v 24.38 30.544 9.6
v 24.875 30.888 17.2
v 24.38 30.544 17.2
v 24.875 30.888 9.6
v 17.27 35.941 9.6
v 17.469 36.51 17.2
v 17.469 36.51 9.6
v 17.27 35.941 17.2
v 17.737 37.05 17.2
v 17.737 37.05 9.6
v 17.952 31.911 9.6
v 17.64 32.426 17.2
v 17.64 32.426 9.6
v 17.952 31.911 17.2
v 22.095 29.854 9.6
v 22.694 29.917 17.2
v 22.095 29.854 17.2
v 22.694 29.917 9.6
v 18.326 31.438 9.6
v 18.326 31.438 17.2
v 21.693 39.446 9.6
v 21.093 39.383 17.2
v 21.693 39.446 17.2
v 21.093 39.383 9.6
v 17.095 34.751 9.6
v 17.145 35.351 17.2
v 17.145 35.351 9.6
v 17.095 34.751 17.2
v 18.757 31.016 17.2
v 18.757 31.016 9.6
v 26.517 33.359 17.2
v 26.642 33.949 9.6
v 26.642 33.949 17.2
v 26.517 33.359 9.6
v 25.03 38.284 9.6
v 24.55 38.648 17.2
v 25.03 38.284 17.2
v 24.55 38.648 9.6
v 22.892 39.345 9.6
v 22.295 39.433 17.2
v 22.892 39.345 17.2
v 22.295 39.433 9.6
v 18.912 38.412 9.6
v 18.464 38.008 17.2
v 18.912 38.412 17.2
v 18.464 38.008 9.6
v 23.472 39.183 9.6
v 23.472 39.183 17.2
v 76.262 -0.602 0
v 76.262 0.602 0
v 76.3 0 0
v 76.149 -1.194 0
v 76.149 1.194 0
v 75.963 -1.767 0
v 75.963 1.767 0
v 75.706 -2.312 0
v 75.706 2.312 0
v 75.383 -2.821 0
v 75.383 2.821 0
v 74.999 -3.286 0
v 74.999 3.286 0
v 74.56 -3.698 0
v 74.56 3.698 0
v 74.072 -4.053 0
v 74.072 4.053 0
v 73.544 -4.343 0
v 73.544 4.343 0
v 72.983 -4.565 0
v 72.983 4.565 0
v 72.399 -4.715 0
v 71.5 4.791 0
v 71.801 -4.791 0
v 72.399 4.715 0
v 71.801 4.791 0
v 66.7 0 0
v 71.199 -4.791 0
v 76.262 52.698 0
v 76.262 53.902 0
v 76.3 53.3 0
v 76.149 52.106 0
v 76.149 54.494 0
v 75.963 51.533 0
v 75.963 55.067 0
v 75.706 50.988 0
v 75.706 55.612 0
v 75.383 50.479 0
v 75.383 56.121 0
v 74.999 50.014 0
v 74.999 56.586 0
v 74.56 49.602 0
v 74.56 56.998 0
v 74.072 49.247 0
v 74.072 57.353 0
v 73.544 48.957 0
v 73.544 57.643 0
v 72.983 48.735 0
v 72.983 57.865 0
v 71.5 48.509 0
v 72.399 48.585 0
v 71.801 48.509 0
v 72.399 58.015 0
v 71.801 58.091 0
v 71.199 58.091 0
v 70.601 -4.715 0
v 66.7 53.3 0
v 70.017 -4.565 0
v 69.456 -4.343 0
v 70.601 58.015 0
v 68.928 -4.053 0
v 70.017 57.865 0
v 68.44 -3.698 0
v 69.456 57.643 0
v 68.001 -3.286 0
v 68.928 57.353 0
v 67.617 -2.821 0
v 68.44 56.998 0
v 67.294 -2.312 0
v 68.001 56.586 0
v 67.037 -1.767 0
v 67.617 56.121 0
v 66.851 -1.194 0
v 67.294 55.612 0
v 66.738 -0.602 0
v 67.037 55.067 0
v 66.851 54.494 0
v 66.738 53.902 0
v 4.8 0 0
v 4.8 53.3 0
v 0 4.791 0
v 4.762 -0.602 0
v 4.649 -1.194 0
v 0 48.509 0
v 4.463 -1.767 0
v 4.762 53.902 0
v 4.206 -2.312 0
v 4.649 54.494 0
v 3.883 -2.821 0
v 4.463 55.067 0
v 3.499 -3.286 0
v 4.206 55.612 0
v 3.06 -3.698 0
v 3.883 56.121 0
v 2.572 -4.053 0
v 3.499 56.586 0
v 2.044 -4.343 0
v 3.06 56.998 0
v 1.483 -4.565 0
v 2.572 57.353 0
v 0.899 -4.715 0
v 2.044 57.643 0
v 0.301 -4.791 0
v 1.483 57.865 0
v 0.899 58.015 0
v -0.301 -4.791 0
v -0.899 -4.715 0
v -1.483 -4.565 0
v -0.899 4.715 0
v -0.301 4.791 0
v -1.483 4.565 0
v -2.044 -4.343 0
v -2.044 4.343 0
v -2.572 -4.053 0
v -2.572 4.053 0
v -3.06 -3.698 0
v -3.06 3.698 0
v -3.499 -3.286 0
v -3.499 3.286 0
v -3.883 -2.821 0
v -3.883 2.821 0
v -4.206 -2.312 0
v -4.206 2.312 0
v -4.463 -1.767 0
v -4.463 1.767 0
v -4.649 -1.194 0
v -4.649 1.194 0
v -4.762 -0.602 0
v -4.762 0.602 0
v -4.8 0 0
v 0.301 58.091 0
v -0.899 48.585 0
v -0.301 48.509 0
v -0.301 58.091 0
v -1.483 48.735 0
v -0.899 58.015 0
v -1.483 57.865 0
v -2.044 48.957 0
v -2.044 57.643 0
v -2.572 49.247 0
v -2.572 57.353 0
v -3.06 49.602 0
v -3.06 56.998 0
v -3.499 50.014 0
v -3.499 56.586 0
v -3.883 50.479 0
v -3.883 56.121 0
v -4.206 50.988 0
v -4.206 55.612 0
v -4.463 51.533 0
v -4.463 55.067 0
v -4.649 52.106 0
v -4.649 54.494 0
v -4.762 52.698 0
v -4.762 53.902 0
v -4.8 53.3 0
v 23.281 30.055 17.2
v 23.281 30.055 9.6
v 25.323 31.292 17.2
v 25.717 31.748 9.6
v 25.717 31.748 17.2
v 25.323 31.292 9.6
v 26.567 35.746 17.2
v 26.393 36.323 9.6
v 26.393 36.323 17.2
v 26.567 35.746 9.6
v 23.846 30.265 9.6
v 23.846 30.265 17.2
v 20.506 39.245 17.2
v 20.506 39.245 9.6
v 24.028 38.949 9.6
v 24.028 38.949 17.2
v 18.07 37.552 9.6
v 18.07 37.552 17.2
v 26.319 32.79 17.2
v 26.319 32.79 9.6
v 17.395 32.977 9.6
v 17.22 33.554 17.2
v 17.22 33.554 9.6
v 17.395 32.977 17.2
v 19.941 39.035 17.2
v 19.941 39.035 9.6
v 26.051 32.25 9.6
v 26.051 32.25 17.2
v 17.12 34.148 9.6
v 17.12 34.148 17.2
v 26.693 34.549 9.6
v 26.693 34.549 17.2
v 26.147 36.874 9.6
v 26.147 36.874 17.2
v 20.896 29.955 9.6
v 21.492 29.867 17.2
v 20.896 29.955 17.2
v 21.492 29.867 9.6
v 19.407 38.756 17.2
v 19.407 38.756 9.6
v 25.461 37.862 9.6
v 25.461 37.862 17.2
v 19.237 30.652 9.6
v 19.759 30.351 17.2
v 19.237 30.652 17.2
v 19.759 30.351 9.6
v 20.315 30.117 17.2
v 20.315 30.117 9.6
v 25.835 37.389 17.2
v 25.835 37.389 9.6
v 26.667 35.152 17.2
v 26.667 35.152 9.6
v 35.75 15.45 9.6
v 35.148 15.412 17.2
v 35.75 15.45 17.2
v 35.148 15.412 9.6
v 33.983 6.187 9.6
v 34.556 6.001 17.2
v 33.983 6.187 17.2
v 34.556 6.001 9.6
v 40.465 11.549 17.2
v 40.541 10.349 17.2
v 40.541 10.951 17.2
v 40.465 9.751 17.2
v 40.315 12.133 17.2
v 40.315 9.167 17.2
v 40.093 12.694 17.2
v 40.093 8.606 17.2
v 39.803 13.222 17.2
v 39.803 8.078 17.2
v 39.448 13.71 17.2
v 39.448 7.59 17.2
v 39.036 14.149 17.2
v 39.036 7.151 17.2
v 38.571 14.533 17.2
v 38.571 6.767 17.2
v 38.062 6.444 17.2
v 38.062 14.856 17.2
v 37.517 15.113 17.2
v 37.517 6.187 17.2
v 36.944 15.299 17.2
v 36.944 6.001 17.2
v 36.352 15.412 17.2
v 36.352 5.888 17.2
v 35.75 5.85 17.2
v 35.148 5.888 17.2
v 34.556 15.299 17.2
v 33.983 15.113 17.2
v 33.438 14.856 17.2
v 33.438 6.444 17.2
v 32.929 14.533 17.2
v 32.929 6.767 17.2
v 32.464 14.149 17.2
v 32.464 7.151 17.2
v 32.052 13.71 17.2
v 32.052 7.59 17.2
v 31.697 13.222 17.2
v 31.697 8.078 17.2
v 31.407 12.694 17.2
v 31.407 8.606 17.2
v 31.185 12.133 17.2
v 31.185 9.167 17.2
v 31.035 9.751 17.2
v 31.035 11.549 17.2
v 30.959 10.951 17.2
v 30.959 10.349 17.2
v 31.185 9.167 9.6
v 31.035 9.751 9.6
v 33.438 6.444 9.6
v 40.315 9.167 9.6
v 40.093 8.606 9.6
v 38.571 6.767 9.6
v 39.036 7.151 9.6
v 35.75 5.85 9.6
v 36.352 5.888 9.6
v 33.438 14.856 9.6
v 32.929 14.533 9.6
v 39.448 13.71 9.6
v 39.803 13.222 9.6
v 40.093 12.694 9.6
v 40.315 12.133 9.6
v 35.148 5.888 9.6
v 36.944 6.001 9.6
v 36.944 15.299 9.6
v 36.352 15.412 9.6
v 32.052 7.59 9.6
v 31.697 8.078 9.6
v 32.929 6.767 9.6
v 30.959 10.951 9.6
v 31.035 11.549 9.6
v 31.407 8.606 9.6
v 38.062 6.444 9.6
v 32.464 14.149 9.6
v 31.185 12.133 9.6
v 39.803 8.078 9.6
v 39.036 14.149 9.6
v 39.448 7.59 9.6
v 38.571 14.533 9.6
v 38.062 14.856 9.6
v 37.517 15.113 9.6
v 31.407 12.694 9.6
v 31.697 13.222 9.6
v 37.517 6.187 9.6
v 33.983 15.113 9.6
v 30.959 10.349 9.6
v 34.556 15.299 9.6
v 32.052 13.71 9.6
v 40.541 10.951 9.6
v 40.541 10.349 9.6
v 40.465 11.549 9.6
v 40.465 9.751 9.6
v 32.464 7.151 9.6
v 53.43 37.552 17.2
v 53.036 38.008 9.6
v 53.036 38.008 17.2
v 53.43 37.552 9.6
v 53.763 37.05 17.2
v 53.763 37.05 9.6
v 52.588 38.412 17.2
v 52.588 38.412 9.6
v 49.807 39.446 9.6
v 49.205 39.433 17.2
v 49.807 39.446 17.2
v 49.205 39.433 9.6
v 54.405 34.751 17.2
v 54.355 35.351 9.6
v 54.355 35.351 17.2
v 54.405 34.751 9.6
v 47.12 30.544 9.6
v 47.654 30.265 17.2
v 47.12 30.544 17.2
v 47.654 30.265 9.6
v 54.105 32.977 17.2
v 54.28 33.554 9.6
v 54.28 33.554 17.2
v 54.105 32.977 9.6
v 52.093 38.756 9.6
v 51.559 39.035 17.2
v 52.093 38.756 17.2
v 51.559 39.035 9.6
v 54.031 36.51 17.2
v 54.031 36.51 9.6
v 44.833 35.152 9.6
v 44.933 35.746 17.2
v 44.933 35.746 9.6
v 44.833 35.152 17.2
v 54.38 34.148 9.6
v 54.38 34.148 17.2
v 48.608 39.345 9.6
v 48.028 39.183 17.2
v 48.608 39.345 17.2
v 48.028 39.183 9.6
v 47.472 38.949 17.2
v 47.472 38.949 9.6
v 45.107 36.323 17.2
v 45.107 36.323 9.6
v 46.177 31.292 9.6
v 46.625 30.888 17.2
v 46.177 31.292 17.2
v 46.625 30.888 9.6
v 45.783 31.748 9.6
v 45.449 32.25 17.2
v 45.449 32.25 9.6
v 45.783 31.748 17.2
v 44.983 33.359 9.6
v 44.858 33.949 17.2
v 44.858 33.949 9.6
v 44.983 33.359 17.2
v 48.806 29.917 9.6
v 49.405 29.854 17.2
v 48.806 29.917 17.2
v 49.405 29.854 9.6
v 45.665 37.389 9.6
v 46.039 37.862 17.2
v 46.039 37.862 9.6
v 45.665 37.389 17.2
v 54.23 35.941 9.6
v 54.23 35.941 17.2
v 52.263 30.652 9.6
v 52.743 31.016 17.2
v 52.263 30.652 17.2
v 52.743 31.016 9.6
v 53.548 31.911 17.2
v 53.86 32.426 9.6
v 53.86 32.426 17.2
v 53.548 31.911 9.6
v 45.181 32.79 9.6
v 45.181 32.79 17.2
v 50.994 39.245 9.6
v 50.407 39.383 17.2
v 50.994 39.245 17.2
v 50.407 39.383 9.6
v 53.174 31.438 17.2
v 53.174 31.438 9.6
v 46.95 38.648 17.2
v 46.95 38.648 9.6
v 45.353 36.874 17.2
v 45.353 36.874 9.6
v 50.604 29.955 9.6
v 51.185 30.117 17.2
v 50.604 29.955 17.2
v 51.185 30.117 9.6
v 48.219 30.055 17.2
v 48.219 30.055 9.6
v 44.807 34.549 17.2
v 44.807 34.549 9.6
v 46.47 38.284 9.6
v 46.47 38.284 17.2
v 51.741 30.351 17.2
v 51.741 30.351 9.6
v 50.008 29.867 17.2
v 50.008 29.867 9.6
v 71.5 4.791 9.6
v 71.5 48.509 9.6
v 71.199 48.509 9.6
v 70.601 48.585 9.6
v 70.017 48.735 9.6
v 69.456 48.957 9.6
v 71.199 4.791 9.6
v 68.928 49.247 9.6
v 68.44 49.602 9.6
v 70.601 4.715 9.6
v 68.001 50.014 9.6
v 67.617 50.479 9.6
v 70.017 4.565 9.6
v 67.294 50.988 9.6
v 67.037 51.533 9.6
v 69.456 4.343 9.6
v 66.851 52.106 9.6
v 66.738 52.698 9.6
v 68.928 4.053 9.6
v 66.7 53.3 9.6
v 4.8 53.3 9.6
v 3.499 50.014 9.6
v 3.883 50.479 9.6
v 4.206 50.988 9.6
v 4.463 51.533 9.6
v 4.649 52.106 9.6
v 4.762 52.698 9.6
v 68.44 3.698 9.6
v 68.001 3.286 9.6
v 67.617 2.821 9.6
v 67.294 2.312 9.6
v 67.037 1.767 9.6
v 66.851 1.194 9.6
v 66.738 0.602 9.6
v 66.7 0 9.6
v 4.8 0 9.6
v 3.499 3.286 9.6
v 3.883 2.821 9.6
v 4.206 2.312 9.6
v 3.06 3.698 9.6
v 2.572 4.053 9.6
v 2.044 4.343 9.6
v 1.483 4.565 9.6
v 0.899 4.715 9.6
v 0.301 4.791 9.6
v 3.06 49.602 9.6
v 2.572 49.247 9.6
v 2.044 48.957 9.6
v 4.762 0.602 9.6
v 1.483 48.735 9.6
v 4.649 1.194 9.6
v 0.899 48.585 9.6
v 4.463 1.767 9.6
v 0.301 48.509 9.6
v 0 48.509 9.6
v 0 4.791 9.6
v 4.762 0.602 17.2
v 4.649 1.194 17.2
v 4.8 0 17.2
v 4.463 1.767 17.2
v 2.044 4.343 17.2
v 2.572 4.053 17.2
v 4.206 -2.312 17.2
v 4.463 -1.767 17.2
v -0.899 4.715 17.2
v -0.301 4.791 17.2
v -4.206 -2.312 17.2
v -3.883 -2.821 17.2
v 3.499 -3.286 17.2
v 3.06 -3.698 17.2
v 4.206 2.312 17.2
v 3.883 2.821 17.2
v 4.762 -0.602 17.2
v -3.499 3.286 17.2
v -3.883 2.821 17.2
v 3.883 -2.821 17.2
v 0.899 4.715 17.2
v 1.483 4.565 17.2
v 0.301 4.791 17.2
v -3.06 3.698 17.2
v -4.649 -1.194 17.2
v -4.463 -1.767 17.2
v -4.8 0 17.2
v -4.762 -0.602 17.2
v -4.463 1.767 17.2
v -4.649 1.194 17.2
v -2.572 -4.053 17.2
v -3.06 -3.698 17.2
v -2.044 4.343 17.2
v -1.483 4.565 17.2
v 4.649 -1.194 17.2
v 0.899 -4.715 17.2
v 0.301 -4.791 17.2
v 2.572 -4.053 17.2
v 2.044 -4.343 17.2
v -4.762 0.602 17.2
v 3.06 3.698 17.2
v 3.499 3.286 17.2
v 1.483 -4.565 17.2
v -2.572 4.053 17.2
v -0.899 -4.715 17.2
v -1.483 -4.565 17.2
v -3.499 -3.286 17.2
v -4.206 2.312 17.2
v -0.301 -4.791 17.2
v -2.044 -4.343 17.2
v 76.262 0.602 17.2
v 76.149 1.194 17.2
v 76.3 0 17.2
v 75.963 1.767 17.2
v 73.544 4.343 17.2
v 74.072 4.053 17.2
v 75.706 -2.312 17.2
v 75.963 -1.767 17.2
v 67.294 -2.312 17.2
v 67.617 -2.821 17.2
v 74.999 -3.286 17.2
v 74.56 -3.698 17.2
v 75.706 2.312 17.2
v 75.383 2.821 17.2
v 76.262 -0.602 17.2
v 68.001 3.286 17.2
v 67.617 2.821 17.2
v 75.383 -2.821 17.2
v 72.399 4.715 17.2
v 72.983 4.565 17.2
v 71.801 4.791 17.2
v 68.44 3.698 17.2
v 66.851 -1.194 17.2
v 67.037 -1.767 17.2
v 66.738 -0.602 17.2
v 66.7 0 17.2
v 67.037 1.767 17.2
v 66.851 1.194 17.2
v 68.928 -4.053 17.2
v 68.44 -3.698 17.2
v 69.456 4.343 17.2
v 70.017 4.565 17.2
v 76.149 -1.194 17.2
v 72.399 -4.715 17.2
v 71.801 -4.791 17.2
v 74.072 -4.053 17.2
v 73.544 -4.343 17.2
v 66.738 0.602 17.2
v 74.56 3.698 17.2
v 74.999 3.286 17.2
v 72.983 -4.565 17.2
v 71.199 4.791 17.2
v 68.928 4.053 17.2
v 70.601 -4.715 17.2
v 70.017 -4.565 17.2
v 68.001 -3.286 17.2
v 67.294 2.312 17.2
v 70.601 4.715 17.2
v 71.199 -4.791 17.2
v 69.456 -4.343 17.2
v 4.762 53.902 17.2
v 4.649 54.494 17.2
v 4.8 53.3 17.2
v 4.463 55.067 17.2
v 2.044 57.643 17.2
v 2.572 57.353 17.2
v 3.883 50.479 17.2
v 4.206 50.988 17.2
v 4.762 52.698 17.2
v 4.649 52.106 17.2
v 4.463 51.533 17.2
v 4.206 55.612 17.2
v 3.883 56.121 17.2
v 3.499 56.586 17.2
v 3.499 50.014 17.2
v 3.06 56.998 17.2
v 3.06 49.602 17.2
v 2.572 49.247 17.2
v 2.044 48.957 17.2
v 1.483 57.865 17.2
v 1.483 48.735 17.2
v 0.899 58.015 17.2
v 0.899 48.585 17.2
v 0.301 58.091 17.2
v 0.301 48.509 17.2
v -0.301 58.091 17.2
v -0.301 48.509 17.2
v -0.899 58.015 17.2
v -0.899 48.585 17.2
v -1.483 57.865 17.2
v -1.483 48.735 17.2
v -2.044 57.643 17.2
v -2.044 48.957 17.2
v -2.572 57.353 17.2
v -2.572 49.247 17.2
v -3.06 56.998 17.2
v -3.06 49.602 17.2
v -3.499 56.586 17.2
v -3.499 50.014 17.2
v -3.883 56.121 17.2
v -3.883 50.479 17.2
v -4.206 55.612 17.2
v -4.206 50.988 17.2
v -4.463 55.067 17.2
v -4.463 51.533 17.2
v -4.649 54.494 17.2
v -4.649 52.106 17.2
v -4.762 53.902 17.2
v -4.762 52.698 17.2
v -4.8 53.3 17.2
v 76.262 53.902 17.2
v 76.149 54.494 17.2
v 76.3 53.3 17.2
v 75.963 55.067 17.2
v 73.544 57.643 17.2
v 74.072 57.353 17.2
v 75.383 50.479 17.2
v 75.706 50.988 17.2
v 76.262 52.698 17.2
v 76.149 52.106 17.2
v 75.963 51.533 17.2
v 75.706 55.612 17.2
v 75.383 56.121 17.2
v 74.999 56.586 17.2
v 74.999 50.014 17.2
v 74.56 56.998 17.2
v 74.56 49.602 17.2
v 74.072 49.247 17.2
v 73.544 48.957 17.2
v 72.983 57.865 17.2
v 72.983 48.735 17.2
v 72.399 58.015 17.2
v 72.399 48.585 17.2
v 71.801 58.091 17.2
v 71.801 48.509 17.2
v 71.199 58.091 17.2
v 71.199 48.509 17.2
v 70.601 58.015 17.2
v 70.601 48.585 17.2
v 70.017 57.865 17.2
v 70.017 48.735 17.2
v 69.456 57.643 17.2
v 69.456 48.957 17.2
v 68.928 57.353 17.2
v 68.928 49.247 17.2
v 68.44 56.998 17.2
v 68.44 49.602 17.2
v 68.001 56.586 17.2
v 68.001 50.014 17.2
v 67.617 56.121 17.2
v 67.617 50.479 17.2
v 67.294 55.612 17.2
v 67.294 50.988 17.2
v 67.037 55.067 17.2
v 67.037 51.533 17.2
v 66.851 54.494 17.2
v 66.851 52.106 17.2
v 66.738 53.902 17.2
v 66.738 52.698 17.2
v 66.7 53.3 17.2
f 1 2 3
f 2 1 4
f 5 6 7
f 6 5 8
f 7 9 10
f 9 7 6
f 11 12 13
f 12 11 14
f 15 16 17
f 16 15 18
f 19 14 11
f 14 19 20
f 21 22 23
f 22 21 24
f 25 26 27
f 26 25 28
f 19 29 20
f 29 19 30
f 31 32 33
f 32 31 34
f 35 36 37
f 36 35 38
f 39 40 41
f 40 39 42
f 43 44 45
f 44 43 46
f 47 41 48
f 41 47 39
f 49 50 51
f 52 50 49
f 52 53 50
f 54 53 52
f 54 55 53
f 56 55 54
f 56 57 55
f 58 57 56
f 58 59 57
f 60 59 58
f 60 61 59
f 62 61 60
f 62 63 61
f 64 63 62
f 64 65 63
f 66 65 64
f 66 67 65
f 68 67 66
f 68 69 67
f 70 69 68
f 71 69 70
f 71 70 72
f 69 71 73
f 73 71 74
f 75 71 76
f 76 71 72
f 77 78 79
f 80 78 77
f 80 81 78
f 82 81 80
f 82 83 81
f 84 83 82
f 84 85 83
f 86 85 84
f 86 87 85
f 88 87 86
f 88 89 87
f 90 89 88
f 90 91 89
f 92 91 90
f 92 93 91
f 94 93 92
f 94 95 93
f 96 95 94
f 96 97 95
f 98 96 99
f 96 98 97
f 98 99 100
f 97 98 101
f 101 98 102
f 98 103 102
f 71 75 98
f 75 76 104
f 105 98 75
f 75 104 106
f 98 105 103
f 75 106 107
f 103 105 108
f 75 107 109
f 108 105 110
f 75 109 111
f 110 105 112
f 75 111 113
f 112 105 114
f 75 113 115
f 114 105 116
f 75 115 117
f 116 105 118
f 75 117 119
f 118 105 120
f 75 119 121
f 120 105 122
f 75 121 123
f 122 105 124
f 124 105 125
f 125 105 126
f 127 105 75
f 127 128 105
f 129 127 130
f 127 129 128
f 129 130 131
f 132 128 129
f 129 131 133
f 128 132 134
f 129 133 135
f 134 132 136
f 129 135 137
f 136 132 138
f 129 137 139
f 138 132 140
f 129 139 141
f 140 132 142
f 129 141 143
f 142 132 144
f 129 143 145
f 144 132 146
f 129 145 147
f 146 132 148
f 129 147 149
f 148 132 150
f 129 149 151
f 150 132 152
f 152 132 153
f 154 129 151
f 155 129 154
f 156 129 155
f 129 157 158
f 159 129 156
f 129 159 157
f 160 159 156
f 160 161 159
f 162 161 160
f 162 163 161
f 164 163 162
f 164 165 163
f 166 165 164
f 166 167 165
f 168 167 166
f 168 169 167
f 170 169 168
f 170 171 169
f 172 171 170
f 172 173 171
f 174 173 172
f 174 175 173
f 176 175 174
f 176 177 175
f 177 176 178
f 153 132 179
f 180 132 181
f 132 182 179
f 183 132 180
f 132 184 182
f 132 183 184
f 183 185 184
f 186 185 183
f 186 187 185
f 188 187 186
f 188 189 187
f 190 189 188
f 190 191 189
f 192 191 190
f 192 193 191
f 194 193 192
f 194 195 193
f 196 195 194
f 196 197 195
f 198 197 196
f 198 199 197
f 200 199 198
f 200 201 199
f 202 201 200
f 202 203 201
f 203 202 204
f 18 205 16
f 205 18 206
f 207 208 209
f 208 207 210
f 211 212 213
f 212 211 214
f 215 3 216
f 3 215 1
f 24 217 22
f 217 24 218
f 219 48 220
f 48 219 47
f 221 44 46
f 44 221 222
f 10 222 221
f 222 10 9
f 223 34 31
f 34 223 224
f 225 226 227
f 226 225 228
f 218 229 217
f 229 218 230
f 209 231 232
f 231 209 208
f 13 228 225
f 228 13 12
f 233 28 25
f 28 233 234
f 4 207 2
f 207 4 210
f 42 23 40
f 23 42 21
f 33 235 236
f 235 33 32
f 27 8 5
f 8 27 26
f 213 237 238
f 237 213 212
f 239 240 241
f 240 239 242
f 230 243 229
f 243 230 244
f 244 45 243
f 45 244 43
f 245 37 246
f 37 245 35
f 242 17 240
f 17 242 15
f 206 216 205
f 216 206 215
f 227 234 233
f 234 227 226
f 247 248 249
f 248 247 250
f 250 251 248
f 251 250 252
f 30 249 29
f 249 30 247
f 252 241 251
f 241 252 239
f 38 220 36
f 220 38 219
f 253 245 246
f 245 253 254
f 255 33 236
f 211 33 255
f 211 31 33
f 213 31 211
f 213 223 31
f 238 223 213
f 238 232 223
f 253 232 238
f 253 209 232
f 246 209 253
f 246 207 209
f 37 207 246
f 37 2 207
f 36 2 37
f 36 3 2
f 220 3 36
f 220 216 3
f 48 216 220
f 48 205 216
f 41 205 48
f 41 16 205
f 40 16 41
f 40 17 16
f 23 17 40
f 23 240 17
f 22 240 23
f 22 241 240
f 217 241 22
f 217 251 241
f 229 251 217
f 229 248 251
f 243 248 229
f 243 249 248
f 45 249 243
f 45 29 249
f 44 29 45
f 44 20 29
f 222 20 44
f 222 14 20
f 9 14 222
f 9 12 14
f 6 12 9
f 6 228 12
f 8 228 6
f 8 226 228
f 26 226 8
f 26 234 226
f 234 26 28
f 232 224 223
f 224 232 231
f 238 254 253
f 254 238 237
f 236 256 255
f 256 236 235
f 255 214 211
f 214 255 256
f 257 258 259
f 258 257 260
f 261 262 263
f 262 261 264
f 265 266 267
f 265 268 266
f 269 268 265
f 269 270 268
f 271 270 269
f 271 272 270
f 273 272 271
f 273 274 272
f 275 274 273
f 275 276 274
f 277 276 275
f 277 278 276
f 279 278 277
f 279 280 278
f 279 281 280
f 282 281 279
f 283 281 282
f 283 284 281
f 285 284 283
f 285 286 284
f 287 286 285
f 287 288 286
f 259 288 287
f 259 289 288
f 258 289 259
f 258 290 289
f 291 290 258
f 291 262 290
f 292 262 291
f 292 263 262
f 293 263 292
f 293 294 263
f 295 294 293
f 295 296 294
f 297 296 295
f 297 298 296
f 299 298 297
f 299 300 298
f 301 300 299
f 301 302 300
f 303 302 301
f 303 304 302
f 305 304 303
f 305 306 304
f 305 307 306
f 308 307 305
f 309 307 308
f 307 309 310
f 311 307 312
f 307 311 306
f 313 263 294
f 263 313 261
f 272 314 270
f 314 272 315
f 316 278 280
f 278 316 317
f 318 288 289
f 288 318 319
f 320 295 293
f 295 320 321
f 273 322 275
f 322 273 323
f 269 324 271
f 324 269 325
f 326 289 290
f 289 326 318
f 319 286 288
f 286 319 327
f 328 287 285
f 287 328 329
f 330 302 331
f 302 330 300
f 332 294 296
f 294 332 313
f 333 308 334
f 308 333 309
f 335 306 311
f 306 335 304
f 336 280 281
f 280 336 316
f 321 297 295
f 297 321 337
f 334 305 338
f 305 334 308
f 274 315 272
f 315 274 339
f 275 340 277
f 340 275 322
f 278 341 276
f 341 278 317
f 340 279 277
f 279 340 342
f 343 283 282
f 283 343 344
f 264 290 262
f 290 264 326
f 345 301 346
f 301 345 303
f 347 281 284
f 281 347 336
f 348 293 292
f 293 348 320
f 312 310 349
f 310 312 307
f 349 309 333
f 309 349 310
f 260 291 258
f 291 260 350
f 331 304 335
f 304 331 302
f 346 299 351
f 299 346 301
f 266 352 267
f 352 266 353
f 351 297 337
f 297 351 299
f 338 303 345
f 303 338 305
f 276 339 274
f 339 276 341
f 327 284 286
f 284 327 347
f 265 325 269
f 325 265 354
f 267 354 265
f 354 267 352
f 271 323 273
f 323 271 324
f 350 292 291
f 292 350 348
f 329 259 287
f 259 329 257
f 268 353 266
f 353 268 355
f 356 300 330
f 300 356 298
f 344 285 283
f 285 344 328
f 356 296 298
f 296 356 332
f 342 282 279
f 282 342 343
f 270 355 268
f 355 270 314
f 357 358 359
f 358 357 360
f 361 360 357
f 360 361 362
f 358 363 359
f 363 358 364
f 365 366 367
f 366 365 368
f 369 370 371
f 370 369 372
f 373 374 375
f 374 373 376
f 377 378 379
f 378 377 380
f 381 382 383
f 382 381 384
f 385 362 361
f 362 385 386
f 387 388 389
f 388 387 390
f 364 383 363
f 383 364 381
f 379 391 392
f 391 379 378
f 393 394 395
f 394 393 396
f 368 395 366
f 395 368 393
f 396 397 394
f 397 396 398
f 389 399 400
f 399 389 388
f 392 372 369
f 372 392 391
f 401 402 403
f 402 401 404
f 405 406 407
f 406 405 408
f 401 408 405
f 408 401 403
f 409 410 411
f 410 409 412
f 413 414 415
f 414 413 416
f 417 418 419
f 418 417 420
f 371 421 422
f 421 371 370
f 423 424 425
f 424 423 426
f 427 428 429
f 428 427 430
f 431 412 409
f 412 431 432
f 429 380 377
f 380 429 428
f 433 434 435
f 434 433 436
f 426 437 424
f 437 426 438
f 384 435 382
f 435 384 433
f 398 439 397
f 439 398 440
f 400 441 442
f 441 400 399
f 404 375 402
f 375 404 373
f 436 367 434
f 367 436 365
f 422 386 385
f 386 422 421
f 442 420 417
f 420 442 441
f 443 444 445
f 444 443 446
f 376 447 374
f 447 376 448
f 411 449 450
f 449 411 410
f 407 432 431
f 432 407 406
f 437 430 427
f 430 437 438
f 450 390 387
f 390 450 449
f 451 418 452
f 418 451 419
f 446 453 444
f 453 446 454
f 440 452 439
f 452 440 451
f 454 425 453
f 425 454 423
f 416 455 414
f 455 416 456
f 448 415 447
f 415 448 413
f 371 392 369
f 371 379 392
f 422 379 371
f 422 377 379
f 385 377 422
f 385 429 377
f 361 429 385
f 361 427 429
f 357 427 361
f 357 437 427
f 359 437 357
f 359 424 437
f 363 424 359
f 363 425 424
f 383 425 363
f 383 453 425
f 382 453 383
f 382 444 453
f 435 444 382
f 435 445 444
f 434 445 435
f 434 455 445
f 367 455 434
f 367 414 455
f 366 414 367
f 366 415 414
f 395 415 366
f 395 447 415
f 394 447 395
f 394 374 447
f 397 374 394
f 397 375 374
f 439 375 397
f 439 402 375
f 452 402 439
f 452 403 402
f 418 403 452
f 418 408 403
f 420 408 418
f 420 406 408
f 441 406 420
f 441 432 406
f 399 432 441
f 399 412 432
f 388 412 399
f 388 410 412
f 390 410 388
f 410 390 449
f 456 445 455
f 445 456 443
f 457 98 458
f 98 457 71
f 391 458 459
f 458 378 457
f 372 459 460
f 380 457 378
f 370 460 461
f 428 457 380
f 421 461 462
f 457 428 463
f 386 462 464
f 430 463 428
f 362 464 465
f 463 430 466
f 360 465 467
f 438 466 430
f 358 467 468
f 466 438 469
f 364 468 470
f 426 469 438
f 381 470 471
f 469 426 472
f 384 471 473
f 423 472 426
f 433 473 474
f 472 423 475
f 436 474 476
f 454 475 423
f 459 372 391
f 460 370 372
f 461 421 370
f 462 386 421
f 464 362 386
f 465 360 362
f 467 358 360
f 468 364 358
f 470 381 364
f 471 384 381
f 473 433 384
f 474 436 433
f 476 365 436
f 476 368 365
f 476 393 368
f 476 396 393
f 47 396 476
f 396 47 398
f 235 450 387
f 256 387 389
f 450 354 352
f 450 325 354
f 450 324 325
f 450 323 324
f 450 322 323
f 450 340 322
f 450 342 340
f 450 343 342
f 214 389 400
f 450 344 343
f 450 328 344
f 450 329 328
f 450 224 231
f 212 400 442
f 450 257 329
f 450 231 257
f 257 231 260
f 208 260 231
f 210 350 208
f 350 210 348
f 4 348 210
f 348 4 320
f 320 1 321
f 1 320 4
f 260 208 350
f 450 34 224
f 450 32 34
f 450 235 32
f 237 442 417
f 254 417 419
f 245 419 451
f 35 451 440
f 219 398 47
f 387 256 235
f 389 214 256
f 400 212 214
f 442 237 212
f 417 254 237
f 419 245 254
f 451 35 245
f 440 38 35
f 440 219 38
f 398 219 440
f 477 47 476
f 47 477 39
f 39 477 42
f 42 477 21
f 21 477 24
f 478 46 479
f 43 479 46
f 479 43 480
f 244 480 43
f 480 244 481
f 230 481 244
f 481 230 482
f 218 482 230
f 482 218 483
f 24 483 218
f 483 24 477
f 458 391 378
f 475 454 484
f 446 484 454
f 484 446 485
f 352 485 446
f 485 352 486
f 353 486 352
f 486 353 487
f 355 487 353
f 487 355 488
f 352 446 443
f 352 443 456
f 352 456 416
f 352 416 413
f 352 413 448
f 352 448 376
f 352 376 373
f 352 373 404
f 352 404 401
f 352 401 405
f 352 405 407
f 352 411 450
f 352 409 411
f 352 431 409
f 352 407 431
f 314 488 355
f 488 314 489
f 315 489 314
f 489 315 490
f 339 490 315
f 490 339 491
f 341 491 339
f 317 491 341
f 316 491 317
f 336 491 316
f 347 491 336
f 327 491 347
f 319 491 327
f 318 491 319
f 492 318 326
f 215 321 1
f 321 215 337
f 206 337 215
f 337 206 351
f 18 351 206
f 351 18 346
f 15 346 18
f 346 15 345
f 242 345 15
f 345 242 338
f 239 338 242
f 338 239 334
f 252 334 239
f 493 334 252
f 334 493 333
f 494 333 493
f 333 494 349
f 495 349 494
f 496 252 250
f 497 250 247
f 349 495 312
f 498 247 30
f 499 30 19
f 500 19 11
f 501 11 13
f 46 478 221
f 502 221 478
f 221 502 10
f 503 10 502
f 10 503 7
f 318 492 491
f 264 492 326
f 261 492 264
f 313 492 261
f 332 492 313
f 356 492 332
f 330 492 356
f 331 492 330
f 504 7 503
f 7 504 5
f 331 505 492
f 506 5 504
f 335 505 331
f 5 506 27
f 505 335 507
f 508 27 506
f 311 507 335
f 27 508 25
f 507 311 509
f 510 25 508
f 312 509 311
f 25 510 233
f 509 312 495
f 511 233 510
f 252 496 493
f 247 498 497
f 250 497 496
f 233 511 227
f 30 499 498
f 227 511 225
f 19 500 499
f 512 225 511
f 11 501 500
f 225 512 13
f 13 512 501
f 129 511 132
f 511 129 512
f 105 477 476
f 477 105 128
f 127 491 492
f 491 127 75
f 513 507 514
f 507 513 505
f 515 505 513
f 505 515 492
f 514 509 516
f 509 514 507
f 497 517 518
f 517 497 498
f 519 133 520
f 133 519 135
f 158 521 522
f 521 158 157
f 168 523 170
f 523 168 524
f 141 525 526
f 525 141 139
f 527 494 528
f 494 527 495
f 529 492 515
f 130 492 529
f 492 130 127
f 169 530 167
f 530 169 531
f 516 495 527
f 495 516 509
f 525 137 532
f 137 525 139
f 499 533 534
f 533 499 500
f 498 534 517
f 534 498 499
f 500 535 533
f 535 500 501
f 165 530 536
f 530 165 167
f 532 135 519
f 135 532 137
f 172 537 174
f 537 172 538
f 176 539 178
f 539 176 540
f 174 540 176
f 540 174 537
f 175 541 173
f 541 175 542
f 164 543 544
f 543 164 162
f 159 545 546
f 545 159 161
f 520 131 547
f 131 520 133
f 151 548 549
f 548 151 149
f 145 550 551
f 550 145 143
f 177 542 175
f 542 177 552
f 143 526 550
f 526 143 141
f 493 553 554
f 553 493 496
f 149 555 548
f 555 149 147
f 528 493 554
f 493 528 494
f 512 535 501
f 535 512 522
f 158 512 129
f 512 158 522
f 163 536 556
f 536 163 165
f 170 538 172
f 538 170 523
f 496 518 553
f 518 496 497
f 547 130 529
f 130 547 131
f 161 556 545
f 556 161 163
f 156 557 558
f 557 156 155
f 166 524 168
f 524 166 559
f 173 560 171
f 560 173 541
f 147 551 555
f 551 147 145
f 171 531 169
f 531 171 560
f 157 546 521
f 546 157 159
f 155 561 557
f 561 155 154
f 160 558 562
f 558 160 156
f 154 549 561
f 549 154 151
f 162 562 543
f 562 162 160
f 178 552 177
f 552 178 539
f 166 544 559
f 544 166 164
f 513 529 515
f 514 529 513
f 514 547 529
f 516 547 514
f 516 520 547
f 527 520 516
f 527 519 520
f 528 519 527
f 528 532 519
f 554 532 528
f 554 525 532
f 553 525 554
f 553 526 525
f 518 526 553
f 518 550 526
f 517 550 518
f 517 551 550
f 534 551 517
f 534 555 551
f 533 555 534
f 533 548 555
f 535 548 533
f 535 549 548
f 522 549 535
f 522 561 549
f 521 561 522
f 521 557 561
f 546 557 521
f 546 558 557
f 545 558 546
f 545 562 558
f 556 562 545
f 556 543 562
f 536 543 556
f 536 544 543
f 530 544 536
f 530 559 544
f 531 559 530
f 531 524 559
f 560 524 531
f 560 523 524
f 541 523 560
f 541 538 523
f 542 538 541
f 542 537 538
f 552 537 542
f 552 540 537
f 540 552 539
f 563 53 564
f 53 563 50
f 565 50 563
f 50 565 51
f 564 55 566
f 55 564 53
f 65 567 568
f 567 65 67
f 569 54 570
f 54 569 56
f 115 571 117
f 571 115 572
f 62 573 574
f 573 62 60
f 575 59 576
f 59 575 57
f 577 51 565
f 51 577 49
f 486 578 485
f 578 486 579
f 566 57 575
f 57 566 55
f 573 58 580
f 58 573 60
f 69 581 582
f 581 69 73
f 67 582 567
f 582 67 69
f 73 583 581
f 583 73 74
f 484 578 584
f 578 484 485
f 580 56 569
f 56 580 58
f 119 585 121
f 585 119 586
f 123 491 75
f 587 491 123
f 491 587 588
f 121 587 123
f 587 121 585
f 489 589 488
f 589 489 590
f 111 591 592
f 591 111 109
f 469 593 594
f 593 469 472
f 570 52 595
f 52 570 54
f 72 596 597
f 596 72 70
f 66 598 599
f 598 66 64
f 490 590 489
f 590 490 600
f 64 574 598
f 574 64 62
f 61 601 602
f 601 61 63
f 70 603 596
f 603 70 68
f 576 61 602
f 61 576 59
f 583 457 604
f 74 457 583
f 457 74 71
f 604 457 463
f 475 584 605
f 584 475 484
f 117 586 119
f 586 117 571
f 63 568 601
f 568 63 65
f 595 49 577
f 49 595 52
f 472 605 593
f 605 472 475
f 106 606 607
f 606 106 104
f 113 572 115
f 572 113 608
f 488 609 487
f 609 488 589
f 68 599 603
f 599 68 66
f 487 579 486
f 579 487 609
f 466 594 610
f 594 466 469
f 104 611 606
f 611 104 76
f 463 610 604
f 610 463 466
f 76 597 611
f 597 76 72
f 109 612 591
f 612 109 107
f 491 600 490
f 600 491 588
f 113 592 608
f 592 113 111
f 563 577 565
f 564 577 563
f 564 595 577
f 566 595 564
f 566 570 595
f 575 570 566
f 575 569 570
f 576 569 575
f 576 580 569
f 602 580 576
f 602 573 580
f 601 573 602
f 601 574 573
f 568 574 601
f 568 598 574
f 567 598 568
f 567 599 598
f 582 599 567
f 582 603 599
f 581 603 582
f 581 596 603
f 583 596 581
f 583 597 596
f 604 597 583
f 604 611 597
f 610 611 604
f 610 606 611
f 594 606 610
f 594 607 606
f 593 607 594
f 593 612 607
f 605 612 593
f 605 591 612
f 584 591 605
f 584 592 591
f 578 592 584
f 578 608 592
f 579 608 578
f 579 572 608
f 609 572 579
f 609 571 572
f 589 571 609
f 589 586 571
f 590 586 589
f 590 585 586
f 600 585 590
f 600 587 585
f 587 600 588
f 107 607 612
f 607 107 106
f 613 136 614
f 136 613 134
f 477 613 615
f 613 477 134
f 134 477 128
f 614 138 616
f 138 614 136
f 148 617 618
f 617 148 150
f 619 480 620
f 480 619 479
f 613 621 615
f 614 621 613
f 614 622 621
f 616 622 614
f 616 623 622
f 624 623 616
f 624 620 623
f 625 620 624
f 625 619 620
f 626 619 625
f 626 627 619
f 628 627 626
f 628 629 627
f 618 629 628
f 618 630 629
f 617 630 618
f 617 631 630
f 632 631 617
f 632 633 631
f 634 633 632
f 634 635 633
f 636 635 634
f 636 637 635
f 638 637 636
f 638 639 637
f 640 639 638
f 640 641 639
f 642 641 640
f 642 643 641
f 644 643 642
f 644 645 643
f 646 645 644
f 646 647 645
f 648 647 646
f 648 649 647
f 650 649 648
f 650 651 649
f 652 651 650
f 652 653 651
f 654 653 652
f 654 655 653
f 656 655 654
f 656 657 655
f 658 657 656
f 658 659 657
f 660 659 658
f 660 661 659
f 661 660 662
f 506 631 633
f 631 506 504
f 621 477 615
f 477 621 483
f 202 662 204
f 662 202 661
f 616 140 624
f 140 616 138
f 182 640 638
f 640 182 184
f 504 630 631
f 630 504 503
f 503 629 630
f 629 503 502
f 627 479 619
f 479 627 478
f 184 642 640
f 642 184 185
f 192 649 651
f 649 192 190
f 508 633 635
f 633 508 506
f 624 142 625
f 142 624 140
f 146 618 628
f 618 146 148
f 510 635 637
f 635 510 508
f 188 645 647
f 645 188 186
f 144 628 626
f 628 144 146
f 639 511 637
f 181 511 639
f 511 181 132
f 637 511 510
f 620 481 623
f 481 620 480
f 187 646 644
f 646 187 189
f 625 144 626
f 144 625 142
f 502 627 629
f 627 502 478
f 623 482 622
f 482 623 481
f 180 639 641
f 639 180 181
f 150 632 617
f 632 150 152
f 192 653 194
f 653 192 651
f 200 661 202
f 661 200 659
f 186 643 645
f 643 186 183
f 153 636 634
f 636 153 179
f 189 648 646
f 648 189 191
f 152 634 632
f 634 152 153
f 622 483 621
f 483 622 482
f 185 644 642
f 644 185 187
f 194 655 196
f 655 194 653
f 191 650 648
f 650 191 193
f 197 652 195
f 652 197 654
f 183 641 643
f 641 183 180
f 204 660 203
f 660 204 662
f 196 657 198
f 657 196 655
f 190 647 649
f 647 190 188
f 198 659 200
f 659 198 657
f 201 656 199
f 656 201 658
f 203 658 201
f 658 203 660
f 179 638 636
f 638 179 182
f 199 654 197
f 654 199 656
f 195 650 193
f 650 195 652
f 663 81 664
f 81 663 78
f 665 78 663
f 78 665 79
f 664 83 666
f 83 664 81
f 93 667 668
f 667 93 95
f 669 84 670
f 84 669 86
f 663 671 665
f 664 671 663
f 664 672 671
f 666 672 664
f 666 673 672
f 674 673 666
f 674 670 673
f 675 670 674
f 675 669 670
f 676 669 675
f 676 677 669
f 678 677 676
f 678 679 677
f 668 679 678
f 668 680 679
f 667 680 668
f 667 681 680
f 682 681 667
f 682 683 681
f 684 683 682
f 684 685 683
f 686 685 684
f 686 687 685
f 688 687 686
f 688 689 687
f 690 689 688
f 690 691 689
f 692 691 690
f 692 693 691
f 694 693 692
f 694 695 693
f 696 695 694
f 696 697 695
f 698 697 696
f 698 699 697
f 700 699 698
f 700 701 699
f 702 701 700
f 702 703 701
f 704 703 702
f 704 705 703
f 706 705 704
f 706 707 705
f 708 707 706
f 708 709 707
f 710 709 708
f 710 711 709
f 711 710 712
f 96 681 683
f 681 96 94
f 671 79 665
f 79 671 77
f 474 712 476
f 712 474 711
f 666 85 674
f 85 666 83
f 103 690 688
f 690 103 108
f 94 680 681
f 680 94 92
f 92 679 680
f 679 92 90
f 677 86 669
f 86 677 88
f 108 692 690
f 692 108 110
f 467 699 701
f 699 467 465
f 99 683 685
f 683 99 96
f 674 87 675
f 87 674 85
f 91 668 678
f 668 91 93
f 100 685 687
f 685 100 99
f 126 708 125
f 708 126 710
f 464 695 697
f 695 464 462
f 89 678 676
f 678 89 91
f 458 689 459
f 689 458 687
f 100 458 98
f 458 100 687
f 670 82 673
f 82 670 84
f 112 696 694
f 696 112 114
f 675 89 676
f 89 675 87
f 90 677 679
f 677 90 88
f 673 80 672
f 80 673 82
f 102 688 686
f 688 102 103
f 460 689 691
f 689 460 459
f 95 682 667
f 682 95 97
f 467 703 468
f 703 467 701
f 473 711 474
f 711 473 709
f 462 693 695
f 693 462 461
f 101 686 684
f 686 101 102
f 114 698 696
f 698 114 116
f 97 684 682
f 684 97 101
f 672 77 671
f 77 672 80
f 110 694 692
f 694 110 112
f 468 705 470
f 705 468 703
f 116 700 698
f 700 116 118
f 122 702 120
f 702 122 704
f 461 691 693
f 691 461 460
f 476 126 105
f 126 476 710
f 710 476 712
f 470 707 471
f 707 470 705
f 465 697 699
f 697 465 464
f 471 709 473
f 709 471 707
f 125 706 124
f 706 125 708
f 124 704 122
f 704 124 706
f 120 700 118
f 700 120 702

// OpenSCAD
$fn = 50;

s = 1.3;

x = 55*s;
y = 41*s; 
z = 9.6;

ultra = 18*s;

cylHeight = 17.2;
cylRad = 9.6/2;

oddCylShift = ultra*sin(30);

module cyl(){
	cylinder(r=cylRad, h=cylHeight);
}

module centerEquilateralTriangle(count, distance){
	cir = 360;
	rot = cir/count;
	for(i = [1:count]){
		rotate([0,0,i*rot])
		translate([distance,0,0])
		cyl();
	}
}

module mainPart() {
	union(){
		cube([x,y,z]);
		
		cyl();
		
		translate([x,0,0])
		cyl();
		
		translate([0,y,0])
		cyl();

		translate([x,y,0])
		cyl();
		
		translate([x/2, y/2,0])
		rotate([0,0,30])
		centerEquilateralTriangle(3, 16);
	}
}

mainPart();
